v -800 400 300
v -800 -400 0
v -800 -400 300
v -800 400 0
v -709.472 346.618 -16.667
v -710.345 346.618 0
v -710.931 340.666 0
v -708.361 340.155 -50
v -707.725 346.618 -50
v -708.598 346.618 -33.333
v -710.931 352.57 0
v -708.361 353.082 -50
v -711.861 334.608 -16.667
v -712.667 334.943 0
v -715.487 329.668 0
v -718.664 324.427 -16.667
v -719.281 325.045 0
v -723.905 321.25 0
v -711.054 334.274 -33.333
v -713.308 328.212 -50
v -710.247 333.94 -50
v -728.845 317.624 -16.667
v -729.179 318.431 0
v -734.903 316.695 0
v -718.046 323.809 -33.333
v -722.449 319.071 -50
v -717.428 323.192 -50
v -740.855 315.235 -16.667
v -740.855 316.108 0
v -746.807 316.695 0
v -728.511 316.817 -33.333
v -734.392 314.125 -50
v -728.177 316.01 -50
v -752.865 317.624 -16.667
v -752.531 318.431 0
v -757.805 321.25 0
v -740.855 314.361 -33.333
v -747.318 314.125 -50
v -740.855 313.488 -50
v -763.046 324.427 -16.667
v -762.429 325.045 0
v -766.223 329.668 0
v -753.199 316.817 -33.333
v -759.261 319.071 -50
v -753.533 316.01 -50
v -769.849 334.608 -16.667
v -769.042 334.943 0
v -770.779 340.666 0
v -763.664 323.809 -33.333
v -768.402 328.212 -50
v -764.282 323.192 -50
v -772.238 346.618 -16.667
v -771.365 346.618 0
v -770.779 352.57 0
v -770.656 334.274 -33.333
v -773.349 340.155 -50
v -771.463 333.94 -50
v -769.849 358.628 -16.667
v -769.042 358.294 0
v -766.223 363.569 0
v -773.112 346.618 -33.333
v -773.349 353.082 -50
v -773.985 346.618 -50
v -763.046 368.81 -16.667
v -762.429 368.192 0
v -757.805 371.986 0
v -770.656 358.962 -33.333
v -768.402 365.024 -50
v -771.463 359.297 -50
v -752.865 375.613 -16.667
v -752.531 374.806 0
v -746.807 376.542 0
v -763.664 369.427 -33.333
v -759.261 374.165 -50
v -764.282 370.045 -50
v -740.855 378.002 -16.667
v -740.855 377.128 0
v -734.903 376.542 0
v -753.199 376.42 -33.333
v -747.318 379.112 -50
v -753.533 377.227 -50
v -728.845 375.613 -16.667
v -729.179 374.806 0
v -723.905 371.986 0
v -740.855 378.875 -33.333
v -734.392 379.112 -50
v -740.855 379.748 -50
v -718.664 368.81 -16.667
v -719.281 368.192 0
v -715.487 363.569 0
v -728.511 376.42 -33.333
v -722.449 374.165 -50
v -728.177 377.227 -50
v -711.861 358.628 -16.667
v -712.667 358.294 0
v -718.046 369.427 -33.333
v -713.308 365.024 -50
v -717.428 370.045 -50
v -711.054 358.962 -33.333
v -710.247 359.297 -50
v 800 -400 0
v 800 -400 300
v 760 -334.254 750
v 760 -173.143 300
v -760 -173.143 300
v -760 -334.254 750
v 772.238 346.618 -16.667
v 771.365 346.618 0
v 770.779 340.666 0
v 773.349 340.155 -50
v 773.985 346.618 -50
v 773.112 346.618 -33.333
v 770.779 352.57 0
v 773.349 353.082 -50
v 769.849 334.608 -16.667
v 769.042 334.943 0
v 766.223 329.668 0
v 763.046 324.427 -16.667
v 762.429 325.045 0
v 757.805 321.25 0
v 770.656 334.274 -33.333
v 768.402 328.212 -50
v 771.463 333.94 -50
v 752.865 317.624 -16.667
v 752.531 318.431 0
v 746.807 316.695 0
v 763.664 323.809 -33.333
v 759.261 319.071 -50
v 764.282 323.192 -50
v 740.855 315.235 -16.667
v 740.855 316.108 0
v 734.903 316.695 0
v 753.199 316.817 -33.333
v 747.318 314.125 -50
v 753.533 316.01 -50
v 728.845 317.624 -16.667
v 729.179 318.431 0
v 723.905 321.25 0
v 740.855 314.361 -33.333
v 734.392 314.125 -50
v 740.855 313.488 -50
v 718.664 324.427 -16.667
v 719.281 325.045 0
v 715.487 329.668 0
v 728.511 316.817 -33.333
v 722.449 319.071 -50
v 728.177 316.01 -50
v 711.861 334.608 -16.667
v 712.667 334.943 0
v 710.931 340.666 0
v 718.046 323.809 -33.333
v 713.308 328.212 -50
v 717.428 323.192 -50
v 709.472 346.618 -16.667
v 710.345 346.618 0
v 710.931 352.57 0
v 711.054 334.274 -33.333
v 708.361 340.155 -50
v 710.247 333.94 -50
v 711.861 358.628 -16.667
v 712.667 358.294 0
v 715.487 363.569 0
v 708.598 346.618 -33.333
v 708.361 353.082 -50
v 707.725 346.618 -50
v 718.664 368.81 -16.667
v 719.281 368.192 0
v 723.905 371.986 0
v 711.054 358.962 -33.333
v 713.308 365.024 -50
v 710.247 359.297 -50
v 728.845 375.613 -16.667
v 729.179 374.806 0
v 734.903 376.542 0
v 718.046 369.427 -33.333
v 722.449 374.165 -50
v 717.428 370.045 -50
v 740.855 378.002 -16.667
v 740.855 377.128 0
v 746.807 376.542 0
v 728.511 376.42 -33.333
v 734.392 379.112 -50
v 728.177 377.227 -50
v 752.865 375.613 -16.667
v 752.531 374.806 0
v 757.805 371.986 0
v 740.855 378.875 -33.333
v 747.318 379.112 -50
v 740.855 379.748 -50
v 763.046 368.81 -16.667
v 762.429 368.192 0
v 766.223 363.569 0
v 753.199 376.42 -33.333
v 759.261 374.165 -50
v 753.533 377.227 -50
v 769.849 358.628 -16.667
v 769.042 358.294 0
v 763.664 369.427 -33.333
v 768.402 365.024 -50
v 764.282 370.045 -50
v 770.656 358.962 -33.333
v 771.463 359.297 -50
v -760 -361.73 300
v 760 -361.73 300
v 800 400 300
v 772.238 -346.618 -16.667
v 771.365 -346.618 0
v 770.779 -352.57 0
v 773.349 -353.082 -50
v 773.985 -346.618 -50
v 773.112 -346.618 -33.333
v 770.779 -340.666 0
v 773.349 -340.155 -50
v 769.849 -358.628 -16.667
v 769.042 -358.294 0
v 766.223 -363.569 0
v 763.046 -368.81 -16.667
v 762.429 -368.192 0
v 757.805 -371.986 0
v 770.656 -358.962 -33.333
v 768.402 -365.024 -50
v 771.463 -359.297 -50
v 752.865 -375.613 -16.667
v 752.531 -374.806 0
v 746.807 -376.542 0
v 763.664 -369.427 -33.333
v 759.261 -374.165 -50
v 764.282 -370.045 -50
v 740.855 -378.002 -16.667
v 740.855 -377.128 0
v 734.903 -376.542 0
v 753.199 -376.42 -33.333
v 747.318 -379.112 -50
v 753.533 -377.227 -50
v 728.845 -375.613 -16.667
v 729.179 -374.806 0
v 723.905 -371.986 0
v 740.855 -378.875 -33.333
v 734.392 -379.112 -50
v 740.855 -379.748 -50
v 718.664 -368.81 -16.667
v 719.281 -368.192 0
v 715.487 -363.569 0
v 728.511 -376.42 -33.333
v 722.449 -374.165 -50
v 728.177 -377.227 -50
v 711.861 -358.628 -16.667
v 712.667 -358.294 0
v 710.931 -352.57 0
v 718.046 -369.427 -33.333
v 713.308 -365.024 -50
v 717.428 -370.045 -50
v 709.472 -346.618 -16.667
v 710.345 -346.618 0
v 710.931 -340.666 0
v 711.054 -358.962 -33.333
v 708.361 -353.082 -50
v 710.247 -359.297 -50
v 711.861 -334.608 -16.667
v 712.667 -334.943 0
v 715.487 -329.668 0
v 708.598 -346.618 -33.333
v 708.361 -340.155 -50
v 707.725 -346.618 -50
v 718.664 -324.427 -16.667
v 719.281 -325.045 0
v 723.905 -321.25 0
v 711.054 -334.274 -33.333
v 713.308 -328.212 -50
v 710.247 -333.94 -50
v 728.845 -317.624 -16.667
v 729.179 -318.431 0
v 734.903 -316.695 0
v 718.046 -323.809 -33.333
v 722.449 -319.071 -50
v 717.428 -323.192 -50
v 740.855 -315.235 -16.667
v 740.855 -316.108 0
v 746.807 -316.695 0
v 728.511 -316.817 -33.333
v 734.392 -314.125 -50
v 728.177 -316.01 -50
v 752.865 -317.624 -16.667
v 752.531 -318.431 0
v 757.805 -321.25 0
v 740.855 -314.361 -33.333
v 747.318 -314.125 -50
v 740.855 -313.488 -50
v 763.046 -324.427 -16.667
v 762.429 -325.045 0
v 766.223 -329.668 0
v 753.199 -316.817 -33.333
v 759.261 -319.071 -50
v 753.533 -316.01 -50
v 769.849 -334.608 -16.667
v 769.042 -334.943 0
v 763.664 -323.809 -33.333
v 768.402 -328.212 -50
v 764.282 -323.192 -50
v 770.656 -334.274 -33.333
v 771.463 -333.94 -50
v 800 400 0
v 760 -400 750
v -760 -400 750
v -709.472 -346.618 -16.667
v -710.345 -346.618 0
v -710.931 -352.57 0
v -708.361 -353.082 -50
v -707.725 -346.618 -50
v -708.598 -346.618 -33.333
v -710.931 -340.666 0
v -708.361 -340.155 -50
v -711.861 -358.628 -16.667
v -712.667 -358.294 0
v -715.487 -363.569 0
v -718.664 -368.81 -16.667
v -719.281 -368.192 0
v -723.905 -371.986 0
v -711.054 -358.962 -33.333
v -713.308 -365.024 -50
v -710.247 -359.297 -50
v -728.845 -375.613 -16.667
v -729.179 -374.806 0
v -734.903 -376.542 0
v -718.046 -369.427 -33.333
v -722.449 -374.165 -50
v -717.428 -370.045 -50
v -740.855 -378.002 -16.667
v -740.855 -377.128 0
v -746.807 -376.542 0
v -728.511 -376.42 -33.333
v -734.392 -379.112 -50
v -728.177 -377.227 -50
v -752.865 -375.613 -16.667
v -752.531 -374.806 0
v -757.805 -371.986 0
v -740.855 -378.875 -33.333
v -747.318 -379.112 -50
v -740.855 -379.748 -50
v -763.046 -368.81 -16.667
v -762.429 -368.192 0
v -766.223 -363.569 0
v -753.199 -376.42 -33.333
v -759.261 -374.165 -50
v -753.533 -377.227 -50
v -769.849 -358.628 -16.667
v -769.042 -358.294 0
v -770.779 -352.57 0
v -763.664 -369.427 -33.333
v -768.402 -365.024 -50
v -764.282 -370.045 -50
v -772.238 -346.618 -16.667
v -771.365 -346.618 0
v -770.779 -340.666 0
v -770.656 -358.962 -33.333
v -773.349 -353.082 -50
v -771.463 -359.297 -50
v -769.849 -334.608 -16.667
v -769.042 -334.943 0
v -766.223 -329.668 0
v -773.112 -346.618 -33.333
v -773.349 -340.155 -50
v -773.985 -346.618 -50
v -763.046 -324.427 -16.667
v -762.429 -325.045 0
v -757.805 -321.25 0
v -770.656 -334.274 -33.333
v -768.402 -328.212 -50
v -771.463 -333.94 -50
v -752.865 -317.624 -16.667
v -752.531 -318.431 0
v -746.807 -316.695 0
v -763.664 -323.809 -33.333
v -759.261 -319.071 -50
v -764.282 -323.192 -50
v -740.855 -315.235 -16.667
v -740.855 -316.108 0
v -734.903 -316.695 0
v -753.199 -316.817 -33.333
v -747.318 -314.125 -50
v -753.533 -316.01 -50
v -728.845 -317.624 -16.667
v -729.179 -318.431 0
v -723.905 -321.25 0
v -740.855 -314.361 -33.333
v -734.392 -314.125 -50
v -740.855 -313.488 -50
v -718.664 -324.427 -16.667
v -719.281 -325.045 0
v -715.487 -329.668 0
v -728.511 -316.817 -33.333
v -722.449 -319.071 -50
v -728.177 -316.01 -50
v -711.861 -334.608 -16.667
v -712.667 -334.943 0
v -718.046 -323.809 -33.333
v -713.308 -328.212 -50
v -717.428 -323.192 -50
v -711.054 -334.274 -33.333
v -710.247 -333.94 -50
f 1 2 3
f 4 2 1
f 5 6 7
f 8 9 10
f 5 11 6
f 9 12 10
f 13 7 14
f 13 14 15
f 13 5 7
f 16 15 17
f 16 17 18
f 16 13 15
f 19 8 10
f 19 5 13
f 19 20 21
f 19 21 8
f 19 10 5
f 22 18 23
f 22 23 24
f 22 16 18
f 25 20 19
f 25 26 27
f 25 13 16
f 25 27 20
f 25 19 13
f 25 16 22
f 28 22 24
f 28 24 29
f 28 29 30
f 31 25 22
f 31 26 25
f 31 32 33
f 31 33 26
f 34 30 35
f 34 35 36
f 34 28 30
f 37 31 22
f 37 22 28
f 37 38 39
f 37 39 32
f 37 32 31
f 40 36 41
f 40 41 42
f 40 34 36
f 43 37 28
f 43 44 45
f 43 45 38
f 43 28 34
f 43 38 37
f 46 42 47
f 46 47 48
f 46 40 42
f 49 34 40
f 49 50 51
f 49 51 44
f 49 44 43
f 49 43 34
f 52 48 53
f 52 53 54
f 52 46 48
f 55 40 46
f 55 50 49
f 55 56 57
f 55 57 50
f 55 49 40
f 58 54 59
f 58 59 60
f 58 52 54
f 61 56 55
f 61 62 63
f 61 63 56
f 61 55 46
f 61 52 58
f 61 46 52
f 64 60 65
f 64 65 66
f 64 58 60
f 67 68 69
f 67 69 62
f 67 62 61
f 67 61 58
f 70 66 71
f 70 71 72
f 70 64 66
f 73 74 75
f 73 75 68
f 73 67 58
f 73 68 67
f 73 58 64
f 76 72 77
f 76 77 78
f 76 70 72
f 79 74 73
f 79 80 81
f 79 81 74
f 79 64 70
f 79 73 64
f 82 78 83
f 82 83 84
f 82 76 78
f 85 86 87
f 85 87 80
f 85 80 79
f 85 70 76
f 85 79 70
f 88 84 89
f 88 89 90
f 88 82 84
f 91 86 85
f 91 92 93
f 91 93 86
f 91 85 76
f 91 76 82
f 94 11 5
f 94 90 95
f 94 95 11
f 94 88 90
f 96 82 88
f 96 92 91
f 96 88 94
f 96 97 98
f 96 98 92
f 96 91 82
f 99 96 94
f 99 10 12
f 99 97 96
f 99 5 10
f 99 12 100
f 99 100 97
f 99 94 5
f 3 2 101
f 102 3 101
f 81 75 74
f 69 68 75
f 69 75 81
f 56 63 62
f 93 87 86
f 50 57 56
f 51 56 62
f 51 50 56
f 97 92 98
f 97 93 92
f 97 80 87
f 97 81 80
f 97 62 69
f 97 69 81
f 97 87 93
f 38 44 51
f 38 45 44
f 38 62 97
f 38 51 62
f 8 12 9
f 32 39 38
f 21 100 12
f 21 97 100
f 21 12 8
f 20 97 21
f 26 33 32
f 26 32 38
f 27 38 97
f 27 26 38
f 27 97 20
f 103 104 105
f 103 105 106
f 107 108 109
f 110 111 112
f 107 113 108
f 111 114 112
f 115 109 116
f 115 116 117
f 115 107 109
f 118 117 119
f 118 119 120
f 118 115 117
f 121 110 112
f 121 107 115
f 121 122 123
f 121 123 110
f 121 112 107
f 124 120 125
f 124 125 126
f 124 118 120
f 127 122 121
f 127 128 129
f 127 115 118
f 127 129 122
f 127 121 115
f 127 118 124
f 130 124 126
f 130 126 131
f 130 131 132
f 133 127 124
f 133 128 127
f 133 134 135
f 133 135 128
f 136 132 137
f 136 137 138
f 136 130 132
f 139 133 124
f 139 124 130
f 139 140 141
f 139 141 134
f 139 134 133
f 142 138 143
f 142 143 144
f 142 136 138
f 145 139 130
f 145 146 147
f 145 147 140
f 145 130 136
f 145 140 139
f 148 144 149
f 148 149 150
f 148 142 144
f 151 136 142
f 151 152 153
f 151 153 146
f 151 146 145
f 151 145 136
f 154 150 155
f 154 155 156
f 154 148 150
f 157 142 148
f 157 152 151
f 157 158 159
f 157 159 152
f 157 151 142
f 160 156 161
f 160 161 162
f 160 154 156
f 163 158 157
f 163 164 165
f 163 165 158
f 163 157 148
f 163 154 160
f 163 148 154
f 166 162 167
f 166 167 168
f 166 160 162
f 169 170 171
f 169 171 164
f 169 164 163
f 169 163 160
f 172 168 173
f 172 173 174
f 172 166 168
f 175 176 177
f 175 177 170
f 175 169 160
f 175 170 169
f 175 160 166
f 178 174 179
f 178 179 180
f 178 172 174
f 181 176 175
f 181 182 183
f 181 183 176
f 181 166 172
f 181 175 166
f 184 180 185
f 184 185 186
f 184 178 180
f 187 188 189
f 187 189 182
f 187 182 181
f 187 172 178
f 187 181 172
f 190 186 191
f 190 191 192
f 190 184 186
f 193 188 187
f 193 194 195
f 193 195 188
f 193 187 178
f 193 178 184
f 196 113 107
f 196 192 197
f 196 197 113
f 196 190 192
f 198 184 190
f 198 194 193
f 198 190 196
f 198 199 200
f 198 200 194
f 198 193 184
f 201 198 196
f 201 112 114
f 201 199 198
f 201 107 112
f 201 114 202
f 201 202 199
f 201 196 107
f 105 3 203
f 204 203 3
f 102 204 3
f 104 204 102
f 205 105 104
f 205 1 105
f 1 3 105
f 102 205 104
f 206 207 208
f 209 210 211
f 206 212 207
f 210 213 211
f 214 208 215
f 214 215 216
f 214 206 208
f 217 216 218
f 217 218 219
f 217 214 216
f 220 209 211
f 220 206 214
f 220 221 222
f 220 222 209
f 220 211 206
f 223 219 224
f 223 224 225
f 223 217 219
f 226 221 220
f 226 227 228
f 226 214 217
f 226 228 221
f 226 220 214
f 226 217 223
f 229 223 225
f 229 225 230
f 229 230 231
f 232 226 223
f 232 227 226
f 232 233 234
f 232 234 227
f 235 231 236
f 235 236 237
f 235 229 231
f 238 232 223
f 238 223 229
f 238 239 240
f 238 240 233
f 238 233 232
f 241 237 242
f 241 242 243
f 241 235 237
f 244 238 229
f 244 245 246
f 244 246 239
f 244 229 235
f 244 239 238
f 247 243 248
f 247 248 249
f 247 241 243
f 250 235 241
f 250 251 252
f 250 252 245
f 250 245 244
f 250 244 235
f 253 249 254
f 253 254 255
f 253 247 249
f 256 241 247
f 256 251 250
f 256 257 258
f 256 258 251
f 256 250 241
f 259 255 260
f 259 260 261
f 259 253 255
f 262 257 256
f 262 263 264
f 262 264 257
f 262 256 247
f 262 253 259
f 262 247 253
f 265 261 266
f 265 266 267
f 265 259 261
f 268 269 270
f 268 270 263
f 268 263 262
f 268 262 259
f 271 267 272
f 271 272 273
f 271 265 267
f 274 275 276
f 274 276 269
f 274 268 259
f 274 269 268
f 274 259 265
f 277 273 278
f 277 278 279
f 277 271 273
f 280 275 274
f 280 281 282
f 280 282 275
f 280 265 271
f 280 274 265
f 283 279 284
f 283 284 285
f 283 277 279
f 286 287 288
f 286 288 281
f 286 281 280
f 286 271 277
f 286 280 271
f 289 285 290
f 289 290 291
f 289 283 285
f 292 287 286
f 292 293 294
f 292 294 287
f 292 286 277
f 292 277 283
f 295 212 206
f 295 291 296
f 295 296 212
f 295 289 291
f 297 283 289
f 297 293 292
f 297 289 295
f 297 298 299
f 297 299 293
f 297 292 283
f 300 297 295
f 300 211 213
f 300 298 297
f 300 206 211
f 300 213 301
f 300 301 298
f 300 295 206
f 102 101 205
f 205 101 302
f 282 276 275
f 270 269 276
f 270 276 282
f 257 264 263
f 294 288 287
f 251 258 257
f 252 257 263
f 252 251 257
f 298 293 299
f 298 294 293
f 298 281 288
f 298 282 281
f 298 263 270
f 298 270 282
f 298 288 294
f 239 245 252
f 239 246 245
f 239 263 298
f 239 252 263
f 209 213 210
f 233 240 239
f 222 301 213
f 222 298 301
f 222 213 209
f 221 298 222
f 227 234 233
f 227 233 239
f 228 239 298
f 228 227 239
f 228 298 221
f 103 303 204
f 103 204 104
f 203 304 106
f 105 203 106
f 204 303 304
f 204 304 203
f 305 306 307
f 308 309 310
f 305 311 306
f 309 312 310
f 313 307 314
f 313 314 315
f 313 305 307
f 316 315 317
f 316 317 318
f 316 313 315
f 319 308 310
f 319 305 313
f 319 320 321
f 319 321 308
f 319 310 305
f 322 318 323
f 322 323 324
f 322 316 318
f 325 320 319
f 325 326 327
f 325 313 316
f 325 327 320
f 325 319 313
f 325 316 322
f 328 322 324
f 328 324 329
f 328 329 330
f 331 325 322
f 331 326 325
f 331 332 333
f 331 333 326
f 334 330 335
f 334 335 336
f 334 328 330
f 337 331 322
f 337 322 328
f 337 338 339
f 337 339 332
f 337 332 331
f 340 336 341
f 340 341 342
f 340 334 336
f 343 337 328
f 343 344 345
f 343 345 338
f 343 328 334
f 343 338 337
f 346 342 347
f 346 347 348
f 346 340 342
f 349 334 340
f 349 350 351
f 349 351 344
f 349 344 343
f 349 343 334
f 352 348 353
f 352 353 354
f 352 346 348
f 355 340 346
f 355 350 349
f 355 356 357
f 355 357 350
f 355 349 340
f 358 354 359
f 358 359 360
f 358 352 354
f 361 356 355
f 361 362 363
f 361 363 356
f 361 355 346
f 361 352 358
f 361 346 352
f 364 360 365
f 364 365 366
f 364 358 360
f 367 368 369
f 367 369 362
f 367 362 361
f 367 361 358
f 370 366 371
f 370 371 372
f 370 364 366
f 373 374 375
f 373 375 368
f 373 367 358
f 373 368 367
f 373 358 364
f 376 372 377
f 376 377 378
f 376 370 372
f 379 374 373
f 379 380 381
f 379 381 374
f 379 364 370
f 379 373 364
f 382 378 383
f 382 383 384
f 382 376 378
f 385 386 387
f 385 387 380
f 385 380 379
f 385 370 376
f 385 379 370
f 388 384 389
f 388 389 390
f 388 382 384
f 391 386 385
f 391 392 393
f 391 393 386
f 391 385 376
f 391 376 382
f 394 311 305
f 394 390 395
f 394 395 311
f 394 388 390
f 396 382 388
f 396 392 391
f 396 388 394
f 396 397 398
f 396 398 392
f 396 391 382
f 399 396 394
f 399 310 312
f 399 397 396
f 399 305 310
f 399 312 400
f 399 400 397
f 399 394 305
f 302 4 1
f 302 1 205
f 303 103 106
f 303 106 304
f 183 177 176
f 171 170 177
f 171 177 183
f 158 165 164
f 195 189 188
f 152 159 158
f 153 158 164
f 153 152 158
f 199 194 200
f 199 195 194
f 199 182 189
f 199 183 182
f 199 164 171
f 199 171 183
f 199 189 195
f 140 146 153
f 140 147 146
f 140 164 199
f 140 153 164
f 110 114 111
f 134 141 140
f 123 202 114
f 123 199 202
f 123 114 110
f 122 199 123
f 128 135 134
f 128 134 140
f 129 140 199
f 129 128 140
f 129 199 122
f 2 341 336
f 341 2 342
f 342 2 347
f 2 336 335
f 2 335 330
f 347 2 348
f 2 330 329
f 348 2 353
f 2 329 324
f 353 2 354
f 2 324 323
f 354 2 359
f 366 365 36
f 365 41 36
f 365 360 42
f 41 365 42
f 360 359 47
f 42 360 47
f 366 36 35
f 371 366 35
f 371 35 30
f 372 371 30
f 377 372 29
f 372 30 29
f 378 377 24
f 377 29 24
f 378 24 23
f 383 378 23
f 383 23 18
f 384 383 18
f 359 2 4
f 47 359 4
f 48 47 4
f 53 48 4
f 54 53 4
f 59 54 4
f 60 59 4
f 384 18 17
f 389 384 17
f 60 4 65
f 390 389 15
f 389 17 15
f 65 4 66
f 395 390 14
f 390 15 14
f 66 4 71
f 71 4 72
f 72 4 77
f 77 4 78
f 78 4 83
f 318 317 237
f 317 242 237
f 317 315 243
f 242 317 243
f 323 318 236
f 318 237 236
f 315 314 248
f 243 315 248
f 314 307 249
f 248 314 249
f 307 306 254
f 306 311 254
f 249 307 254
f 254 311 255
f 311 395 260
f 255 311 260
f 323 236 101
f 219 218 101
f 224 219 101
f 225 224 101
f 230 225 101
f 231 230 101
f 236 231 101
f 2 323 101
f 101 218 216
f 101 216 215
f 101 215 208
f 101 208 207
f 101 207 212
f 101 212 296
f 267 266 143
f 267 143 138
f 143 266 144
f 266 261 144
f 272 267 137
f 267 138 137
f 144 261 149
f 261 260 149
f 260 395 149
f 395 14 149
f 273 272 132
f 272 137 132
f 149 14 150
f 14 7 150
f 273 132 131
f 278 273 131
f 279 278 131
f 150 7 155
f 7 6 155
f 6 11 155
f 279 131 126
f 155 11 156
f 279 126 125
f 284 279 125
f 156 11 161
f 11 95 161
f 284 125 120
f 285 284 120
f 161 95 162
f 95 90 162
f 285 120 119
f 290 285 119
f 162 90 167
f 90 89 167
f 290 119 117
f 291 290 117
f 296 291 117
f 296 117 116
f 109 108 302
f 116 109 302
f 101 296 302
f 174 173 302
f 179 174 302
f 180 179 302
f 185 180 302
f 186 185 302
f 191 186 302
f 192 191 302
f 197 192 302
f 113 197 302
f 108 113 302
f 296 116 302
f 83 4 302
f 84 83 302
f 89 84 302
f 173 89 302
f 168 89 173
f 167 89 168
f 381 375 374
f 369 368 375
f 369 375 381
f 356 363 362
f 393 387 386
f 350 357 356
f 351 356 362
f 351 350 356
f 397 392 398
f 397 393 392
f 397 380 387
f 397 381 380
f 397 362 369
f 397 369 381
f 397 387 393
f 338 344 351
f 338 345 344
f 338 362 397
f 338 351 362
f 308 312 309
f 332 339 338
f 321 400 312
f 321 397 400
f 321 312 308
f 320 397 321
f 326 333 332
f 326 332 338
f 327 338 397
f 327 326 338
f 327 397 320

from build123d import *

# Parameters (mm, degrees)
F0_W     = 1600
F0_H     = 800
F1_DEPTH = 300
F2_R     = 30.5098573856
F3_DEPTH = 50
F3_TAPER = -3
F5_DEPTH = 760


with BuildPart() as f1:
    # F0 (on Top) → F1 (new body)
    with BuildSketch(Plane.XY):
        Rectangle(F0_W, F0_H)
    extrude(amount=F1_DEPTH)

    # F2 (on face) → F3 (join)
    with BuildSketch(Plane(origin=(0, 0, 0), x_dir=(1, 0, 0), z_dir=(0, 0, -1))):
        with Locations((-740.8549189568, -346.6182351112)):
            Circle(F2_R)
        with Locations((740.8549189568, -346.6182351112)):
            Circle(F2_R)
        with Locations((740.8549189568, 346.6182351112)):
            Circle(F2_R)
        with Locations((-740.8549189568, 346.6182351112)):
            Circle(F2_R)
    extrude(amount=F3_DEPTH, taper=F3_TAPER)

    # F4 (on Right) → F5 (join, symmetric)
    with BuildSketch(Plane.YZ):
        Polygon((-355.8277244632, 230.5950983165), (-157.0006990349, 254.912089853), (-334.2544257721, 750), (-400, 750), align=None)
    extrude(amount=F5_DEPTH, both=True)


solid = f1.part
